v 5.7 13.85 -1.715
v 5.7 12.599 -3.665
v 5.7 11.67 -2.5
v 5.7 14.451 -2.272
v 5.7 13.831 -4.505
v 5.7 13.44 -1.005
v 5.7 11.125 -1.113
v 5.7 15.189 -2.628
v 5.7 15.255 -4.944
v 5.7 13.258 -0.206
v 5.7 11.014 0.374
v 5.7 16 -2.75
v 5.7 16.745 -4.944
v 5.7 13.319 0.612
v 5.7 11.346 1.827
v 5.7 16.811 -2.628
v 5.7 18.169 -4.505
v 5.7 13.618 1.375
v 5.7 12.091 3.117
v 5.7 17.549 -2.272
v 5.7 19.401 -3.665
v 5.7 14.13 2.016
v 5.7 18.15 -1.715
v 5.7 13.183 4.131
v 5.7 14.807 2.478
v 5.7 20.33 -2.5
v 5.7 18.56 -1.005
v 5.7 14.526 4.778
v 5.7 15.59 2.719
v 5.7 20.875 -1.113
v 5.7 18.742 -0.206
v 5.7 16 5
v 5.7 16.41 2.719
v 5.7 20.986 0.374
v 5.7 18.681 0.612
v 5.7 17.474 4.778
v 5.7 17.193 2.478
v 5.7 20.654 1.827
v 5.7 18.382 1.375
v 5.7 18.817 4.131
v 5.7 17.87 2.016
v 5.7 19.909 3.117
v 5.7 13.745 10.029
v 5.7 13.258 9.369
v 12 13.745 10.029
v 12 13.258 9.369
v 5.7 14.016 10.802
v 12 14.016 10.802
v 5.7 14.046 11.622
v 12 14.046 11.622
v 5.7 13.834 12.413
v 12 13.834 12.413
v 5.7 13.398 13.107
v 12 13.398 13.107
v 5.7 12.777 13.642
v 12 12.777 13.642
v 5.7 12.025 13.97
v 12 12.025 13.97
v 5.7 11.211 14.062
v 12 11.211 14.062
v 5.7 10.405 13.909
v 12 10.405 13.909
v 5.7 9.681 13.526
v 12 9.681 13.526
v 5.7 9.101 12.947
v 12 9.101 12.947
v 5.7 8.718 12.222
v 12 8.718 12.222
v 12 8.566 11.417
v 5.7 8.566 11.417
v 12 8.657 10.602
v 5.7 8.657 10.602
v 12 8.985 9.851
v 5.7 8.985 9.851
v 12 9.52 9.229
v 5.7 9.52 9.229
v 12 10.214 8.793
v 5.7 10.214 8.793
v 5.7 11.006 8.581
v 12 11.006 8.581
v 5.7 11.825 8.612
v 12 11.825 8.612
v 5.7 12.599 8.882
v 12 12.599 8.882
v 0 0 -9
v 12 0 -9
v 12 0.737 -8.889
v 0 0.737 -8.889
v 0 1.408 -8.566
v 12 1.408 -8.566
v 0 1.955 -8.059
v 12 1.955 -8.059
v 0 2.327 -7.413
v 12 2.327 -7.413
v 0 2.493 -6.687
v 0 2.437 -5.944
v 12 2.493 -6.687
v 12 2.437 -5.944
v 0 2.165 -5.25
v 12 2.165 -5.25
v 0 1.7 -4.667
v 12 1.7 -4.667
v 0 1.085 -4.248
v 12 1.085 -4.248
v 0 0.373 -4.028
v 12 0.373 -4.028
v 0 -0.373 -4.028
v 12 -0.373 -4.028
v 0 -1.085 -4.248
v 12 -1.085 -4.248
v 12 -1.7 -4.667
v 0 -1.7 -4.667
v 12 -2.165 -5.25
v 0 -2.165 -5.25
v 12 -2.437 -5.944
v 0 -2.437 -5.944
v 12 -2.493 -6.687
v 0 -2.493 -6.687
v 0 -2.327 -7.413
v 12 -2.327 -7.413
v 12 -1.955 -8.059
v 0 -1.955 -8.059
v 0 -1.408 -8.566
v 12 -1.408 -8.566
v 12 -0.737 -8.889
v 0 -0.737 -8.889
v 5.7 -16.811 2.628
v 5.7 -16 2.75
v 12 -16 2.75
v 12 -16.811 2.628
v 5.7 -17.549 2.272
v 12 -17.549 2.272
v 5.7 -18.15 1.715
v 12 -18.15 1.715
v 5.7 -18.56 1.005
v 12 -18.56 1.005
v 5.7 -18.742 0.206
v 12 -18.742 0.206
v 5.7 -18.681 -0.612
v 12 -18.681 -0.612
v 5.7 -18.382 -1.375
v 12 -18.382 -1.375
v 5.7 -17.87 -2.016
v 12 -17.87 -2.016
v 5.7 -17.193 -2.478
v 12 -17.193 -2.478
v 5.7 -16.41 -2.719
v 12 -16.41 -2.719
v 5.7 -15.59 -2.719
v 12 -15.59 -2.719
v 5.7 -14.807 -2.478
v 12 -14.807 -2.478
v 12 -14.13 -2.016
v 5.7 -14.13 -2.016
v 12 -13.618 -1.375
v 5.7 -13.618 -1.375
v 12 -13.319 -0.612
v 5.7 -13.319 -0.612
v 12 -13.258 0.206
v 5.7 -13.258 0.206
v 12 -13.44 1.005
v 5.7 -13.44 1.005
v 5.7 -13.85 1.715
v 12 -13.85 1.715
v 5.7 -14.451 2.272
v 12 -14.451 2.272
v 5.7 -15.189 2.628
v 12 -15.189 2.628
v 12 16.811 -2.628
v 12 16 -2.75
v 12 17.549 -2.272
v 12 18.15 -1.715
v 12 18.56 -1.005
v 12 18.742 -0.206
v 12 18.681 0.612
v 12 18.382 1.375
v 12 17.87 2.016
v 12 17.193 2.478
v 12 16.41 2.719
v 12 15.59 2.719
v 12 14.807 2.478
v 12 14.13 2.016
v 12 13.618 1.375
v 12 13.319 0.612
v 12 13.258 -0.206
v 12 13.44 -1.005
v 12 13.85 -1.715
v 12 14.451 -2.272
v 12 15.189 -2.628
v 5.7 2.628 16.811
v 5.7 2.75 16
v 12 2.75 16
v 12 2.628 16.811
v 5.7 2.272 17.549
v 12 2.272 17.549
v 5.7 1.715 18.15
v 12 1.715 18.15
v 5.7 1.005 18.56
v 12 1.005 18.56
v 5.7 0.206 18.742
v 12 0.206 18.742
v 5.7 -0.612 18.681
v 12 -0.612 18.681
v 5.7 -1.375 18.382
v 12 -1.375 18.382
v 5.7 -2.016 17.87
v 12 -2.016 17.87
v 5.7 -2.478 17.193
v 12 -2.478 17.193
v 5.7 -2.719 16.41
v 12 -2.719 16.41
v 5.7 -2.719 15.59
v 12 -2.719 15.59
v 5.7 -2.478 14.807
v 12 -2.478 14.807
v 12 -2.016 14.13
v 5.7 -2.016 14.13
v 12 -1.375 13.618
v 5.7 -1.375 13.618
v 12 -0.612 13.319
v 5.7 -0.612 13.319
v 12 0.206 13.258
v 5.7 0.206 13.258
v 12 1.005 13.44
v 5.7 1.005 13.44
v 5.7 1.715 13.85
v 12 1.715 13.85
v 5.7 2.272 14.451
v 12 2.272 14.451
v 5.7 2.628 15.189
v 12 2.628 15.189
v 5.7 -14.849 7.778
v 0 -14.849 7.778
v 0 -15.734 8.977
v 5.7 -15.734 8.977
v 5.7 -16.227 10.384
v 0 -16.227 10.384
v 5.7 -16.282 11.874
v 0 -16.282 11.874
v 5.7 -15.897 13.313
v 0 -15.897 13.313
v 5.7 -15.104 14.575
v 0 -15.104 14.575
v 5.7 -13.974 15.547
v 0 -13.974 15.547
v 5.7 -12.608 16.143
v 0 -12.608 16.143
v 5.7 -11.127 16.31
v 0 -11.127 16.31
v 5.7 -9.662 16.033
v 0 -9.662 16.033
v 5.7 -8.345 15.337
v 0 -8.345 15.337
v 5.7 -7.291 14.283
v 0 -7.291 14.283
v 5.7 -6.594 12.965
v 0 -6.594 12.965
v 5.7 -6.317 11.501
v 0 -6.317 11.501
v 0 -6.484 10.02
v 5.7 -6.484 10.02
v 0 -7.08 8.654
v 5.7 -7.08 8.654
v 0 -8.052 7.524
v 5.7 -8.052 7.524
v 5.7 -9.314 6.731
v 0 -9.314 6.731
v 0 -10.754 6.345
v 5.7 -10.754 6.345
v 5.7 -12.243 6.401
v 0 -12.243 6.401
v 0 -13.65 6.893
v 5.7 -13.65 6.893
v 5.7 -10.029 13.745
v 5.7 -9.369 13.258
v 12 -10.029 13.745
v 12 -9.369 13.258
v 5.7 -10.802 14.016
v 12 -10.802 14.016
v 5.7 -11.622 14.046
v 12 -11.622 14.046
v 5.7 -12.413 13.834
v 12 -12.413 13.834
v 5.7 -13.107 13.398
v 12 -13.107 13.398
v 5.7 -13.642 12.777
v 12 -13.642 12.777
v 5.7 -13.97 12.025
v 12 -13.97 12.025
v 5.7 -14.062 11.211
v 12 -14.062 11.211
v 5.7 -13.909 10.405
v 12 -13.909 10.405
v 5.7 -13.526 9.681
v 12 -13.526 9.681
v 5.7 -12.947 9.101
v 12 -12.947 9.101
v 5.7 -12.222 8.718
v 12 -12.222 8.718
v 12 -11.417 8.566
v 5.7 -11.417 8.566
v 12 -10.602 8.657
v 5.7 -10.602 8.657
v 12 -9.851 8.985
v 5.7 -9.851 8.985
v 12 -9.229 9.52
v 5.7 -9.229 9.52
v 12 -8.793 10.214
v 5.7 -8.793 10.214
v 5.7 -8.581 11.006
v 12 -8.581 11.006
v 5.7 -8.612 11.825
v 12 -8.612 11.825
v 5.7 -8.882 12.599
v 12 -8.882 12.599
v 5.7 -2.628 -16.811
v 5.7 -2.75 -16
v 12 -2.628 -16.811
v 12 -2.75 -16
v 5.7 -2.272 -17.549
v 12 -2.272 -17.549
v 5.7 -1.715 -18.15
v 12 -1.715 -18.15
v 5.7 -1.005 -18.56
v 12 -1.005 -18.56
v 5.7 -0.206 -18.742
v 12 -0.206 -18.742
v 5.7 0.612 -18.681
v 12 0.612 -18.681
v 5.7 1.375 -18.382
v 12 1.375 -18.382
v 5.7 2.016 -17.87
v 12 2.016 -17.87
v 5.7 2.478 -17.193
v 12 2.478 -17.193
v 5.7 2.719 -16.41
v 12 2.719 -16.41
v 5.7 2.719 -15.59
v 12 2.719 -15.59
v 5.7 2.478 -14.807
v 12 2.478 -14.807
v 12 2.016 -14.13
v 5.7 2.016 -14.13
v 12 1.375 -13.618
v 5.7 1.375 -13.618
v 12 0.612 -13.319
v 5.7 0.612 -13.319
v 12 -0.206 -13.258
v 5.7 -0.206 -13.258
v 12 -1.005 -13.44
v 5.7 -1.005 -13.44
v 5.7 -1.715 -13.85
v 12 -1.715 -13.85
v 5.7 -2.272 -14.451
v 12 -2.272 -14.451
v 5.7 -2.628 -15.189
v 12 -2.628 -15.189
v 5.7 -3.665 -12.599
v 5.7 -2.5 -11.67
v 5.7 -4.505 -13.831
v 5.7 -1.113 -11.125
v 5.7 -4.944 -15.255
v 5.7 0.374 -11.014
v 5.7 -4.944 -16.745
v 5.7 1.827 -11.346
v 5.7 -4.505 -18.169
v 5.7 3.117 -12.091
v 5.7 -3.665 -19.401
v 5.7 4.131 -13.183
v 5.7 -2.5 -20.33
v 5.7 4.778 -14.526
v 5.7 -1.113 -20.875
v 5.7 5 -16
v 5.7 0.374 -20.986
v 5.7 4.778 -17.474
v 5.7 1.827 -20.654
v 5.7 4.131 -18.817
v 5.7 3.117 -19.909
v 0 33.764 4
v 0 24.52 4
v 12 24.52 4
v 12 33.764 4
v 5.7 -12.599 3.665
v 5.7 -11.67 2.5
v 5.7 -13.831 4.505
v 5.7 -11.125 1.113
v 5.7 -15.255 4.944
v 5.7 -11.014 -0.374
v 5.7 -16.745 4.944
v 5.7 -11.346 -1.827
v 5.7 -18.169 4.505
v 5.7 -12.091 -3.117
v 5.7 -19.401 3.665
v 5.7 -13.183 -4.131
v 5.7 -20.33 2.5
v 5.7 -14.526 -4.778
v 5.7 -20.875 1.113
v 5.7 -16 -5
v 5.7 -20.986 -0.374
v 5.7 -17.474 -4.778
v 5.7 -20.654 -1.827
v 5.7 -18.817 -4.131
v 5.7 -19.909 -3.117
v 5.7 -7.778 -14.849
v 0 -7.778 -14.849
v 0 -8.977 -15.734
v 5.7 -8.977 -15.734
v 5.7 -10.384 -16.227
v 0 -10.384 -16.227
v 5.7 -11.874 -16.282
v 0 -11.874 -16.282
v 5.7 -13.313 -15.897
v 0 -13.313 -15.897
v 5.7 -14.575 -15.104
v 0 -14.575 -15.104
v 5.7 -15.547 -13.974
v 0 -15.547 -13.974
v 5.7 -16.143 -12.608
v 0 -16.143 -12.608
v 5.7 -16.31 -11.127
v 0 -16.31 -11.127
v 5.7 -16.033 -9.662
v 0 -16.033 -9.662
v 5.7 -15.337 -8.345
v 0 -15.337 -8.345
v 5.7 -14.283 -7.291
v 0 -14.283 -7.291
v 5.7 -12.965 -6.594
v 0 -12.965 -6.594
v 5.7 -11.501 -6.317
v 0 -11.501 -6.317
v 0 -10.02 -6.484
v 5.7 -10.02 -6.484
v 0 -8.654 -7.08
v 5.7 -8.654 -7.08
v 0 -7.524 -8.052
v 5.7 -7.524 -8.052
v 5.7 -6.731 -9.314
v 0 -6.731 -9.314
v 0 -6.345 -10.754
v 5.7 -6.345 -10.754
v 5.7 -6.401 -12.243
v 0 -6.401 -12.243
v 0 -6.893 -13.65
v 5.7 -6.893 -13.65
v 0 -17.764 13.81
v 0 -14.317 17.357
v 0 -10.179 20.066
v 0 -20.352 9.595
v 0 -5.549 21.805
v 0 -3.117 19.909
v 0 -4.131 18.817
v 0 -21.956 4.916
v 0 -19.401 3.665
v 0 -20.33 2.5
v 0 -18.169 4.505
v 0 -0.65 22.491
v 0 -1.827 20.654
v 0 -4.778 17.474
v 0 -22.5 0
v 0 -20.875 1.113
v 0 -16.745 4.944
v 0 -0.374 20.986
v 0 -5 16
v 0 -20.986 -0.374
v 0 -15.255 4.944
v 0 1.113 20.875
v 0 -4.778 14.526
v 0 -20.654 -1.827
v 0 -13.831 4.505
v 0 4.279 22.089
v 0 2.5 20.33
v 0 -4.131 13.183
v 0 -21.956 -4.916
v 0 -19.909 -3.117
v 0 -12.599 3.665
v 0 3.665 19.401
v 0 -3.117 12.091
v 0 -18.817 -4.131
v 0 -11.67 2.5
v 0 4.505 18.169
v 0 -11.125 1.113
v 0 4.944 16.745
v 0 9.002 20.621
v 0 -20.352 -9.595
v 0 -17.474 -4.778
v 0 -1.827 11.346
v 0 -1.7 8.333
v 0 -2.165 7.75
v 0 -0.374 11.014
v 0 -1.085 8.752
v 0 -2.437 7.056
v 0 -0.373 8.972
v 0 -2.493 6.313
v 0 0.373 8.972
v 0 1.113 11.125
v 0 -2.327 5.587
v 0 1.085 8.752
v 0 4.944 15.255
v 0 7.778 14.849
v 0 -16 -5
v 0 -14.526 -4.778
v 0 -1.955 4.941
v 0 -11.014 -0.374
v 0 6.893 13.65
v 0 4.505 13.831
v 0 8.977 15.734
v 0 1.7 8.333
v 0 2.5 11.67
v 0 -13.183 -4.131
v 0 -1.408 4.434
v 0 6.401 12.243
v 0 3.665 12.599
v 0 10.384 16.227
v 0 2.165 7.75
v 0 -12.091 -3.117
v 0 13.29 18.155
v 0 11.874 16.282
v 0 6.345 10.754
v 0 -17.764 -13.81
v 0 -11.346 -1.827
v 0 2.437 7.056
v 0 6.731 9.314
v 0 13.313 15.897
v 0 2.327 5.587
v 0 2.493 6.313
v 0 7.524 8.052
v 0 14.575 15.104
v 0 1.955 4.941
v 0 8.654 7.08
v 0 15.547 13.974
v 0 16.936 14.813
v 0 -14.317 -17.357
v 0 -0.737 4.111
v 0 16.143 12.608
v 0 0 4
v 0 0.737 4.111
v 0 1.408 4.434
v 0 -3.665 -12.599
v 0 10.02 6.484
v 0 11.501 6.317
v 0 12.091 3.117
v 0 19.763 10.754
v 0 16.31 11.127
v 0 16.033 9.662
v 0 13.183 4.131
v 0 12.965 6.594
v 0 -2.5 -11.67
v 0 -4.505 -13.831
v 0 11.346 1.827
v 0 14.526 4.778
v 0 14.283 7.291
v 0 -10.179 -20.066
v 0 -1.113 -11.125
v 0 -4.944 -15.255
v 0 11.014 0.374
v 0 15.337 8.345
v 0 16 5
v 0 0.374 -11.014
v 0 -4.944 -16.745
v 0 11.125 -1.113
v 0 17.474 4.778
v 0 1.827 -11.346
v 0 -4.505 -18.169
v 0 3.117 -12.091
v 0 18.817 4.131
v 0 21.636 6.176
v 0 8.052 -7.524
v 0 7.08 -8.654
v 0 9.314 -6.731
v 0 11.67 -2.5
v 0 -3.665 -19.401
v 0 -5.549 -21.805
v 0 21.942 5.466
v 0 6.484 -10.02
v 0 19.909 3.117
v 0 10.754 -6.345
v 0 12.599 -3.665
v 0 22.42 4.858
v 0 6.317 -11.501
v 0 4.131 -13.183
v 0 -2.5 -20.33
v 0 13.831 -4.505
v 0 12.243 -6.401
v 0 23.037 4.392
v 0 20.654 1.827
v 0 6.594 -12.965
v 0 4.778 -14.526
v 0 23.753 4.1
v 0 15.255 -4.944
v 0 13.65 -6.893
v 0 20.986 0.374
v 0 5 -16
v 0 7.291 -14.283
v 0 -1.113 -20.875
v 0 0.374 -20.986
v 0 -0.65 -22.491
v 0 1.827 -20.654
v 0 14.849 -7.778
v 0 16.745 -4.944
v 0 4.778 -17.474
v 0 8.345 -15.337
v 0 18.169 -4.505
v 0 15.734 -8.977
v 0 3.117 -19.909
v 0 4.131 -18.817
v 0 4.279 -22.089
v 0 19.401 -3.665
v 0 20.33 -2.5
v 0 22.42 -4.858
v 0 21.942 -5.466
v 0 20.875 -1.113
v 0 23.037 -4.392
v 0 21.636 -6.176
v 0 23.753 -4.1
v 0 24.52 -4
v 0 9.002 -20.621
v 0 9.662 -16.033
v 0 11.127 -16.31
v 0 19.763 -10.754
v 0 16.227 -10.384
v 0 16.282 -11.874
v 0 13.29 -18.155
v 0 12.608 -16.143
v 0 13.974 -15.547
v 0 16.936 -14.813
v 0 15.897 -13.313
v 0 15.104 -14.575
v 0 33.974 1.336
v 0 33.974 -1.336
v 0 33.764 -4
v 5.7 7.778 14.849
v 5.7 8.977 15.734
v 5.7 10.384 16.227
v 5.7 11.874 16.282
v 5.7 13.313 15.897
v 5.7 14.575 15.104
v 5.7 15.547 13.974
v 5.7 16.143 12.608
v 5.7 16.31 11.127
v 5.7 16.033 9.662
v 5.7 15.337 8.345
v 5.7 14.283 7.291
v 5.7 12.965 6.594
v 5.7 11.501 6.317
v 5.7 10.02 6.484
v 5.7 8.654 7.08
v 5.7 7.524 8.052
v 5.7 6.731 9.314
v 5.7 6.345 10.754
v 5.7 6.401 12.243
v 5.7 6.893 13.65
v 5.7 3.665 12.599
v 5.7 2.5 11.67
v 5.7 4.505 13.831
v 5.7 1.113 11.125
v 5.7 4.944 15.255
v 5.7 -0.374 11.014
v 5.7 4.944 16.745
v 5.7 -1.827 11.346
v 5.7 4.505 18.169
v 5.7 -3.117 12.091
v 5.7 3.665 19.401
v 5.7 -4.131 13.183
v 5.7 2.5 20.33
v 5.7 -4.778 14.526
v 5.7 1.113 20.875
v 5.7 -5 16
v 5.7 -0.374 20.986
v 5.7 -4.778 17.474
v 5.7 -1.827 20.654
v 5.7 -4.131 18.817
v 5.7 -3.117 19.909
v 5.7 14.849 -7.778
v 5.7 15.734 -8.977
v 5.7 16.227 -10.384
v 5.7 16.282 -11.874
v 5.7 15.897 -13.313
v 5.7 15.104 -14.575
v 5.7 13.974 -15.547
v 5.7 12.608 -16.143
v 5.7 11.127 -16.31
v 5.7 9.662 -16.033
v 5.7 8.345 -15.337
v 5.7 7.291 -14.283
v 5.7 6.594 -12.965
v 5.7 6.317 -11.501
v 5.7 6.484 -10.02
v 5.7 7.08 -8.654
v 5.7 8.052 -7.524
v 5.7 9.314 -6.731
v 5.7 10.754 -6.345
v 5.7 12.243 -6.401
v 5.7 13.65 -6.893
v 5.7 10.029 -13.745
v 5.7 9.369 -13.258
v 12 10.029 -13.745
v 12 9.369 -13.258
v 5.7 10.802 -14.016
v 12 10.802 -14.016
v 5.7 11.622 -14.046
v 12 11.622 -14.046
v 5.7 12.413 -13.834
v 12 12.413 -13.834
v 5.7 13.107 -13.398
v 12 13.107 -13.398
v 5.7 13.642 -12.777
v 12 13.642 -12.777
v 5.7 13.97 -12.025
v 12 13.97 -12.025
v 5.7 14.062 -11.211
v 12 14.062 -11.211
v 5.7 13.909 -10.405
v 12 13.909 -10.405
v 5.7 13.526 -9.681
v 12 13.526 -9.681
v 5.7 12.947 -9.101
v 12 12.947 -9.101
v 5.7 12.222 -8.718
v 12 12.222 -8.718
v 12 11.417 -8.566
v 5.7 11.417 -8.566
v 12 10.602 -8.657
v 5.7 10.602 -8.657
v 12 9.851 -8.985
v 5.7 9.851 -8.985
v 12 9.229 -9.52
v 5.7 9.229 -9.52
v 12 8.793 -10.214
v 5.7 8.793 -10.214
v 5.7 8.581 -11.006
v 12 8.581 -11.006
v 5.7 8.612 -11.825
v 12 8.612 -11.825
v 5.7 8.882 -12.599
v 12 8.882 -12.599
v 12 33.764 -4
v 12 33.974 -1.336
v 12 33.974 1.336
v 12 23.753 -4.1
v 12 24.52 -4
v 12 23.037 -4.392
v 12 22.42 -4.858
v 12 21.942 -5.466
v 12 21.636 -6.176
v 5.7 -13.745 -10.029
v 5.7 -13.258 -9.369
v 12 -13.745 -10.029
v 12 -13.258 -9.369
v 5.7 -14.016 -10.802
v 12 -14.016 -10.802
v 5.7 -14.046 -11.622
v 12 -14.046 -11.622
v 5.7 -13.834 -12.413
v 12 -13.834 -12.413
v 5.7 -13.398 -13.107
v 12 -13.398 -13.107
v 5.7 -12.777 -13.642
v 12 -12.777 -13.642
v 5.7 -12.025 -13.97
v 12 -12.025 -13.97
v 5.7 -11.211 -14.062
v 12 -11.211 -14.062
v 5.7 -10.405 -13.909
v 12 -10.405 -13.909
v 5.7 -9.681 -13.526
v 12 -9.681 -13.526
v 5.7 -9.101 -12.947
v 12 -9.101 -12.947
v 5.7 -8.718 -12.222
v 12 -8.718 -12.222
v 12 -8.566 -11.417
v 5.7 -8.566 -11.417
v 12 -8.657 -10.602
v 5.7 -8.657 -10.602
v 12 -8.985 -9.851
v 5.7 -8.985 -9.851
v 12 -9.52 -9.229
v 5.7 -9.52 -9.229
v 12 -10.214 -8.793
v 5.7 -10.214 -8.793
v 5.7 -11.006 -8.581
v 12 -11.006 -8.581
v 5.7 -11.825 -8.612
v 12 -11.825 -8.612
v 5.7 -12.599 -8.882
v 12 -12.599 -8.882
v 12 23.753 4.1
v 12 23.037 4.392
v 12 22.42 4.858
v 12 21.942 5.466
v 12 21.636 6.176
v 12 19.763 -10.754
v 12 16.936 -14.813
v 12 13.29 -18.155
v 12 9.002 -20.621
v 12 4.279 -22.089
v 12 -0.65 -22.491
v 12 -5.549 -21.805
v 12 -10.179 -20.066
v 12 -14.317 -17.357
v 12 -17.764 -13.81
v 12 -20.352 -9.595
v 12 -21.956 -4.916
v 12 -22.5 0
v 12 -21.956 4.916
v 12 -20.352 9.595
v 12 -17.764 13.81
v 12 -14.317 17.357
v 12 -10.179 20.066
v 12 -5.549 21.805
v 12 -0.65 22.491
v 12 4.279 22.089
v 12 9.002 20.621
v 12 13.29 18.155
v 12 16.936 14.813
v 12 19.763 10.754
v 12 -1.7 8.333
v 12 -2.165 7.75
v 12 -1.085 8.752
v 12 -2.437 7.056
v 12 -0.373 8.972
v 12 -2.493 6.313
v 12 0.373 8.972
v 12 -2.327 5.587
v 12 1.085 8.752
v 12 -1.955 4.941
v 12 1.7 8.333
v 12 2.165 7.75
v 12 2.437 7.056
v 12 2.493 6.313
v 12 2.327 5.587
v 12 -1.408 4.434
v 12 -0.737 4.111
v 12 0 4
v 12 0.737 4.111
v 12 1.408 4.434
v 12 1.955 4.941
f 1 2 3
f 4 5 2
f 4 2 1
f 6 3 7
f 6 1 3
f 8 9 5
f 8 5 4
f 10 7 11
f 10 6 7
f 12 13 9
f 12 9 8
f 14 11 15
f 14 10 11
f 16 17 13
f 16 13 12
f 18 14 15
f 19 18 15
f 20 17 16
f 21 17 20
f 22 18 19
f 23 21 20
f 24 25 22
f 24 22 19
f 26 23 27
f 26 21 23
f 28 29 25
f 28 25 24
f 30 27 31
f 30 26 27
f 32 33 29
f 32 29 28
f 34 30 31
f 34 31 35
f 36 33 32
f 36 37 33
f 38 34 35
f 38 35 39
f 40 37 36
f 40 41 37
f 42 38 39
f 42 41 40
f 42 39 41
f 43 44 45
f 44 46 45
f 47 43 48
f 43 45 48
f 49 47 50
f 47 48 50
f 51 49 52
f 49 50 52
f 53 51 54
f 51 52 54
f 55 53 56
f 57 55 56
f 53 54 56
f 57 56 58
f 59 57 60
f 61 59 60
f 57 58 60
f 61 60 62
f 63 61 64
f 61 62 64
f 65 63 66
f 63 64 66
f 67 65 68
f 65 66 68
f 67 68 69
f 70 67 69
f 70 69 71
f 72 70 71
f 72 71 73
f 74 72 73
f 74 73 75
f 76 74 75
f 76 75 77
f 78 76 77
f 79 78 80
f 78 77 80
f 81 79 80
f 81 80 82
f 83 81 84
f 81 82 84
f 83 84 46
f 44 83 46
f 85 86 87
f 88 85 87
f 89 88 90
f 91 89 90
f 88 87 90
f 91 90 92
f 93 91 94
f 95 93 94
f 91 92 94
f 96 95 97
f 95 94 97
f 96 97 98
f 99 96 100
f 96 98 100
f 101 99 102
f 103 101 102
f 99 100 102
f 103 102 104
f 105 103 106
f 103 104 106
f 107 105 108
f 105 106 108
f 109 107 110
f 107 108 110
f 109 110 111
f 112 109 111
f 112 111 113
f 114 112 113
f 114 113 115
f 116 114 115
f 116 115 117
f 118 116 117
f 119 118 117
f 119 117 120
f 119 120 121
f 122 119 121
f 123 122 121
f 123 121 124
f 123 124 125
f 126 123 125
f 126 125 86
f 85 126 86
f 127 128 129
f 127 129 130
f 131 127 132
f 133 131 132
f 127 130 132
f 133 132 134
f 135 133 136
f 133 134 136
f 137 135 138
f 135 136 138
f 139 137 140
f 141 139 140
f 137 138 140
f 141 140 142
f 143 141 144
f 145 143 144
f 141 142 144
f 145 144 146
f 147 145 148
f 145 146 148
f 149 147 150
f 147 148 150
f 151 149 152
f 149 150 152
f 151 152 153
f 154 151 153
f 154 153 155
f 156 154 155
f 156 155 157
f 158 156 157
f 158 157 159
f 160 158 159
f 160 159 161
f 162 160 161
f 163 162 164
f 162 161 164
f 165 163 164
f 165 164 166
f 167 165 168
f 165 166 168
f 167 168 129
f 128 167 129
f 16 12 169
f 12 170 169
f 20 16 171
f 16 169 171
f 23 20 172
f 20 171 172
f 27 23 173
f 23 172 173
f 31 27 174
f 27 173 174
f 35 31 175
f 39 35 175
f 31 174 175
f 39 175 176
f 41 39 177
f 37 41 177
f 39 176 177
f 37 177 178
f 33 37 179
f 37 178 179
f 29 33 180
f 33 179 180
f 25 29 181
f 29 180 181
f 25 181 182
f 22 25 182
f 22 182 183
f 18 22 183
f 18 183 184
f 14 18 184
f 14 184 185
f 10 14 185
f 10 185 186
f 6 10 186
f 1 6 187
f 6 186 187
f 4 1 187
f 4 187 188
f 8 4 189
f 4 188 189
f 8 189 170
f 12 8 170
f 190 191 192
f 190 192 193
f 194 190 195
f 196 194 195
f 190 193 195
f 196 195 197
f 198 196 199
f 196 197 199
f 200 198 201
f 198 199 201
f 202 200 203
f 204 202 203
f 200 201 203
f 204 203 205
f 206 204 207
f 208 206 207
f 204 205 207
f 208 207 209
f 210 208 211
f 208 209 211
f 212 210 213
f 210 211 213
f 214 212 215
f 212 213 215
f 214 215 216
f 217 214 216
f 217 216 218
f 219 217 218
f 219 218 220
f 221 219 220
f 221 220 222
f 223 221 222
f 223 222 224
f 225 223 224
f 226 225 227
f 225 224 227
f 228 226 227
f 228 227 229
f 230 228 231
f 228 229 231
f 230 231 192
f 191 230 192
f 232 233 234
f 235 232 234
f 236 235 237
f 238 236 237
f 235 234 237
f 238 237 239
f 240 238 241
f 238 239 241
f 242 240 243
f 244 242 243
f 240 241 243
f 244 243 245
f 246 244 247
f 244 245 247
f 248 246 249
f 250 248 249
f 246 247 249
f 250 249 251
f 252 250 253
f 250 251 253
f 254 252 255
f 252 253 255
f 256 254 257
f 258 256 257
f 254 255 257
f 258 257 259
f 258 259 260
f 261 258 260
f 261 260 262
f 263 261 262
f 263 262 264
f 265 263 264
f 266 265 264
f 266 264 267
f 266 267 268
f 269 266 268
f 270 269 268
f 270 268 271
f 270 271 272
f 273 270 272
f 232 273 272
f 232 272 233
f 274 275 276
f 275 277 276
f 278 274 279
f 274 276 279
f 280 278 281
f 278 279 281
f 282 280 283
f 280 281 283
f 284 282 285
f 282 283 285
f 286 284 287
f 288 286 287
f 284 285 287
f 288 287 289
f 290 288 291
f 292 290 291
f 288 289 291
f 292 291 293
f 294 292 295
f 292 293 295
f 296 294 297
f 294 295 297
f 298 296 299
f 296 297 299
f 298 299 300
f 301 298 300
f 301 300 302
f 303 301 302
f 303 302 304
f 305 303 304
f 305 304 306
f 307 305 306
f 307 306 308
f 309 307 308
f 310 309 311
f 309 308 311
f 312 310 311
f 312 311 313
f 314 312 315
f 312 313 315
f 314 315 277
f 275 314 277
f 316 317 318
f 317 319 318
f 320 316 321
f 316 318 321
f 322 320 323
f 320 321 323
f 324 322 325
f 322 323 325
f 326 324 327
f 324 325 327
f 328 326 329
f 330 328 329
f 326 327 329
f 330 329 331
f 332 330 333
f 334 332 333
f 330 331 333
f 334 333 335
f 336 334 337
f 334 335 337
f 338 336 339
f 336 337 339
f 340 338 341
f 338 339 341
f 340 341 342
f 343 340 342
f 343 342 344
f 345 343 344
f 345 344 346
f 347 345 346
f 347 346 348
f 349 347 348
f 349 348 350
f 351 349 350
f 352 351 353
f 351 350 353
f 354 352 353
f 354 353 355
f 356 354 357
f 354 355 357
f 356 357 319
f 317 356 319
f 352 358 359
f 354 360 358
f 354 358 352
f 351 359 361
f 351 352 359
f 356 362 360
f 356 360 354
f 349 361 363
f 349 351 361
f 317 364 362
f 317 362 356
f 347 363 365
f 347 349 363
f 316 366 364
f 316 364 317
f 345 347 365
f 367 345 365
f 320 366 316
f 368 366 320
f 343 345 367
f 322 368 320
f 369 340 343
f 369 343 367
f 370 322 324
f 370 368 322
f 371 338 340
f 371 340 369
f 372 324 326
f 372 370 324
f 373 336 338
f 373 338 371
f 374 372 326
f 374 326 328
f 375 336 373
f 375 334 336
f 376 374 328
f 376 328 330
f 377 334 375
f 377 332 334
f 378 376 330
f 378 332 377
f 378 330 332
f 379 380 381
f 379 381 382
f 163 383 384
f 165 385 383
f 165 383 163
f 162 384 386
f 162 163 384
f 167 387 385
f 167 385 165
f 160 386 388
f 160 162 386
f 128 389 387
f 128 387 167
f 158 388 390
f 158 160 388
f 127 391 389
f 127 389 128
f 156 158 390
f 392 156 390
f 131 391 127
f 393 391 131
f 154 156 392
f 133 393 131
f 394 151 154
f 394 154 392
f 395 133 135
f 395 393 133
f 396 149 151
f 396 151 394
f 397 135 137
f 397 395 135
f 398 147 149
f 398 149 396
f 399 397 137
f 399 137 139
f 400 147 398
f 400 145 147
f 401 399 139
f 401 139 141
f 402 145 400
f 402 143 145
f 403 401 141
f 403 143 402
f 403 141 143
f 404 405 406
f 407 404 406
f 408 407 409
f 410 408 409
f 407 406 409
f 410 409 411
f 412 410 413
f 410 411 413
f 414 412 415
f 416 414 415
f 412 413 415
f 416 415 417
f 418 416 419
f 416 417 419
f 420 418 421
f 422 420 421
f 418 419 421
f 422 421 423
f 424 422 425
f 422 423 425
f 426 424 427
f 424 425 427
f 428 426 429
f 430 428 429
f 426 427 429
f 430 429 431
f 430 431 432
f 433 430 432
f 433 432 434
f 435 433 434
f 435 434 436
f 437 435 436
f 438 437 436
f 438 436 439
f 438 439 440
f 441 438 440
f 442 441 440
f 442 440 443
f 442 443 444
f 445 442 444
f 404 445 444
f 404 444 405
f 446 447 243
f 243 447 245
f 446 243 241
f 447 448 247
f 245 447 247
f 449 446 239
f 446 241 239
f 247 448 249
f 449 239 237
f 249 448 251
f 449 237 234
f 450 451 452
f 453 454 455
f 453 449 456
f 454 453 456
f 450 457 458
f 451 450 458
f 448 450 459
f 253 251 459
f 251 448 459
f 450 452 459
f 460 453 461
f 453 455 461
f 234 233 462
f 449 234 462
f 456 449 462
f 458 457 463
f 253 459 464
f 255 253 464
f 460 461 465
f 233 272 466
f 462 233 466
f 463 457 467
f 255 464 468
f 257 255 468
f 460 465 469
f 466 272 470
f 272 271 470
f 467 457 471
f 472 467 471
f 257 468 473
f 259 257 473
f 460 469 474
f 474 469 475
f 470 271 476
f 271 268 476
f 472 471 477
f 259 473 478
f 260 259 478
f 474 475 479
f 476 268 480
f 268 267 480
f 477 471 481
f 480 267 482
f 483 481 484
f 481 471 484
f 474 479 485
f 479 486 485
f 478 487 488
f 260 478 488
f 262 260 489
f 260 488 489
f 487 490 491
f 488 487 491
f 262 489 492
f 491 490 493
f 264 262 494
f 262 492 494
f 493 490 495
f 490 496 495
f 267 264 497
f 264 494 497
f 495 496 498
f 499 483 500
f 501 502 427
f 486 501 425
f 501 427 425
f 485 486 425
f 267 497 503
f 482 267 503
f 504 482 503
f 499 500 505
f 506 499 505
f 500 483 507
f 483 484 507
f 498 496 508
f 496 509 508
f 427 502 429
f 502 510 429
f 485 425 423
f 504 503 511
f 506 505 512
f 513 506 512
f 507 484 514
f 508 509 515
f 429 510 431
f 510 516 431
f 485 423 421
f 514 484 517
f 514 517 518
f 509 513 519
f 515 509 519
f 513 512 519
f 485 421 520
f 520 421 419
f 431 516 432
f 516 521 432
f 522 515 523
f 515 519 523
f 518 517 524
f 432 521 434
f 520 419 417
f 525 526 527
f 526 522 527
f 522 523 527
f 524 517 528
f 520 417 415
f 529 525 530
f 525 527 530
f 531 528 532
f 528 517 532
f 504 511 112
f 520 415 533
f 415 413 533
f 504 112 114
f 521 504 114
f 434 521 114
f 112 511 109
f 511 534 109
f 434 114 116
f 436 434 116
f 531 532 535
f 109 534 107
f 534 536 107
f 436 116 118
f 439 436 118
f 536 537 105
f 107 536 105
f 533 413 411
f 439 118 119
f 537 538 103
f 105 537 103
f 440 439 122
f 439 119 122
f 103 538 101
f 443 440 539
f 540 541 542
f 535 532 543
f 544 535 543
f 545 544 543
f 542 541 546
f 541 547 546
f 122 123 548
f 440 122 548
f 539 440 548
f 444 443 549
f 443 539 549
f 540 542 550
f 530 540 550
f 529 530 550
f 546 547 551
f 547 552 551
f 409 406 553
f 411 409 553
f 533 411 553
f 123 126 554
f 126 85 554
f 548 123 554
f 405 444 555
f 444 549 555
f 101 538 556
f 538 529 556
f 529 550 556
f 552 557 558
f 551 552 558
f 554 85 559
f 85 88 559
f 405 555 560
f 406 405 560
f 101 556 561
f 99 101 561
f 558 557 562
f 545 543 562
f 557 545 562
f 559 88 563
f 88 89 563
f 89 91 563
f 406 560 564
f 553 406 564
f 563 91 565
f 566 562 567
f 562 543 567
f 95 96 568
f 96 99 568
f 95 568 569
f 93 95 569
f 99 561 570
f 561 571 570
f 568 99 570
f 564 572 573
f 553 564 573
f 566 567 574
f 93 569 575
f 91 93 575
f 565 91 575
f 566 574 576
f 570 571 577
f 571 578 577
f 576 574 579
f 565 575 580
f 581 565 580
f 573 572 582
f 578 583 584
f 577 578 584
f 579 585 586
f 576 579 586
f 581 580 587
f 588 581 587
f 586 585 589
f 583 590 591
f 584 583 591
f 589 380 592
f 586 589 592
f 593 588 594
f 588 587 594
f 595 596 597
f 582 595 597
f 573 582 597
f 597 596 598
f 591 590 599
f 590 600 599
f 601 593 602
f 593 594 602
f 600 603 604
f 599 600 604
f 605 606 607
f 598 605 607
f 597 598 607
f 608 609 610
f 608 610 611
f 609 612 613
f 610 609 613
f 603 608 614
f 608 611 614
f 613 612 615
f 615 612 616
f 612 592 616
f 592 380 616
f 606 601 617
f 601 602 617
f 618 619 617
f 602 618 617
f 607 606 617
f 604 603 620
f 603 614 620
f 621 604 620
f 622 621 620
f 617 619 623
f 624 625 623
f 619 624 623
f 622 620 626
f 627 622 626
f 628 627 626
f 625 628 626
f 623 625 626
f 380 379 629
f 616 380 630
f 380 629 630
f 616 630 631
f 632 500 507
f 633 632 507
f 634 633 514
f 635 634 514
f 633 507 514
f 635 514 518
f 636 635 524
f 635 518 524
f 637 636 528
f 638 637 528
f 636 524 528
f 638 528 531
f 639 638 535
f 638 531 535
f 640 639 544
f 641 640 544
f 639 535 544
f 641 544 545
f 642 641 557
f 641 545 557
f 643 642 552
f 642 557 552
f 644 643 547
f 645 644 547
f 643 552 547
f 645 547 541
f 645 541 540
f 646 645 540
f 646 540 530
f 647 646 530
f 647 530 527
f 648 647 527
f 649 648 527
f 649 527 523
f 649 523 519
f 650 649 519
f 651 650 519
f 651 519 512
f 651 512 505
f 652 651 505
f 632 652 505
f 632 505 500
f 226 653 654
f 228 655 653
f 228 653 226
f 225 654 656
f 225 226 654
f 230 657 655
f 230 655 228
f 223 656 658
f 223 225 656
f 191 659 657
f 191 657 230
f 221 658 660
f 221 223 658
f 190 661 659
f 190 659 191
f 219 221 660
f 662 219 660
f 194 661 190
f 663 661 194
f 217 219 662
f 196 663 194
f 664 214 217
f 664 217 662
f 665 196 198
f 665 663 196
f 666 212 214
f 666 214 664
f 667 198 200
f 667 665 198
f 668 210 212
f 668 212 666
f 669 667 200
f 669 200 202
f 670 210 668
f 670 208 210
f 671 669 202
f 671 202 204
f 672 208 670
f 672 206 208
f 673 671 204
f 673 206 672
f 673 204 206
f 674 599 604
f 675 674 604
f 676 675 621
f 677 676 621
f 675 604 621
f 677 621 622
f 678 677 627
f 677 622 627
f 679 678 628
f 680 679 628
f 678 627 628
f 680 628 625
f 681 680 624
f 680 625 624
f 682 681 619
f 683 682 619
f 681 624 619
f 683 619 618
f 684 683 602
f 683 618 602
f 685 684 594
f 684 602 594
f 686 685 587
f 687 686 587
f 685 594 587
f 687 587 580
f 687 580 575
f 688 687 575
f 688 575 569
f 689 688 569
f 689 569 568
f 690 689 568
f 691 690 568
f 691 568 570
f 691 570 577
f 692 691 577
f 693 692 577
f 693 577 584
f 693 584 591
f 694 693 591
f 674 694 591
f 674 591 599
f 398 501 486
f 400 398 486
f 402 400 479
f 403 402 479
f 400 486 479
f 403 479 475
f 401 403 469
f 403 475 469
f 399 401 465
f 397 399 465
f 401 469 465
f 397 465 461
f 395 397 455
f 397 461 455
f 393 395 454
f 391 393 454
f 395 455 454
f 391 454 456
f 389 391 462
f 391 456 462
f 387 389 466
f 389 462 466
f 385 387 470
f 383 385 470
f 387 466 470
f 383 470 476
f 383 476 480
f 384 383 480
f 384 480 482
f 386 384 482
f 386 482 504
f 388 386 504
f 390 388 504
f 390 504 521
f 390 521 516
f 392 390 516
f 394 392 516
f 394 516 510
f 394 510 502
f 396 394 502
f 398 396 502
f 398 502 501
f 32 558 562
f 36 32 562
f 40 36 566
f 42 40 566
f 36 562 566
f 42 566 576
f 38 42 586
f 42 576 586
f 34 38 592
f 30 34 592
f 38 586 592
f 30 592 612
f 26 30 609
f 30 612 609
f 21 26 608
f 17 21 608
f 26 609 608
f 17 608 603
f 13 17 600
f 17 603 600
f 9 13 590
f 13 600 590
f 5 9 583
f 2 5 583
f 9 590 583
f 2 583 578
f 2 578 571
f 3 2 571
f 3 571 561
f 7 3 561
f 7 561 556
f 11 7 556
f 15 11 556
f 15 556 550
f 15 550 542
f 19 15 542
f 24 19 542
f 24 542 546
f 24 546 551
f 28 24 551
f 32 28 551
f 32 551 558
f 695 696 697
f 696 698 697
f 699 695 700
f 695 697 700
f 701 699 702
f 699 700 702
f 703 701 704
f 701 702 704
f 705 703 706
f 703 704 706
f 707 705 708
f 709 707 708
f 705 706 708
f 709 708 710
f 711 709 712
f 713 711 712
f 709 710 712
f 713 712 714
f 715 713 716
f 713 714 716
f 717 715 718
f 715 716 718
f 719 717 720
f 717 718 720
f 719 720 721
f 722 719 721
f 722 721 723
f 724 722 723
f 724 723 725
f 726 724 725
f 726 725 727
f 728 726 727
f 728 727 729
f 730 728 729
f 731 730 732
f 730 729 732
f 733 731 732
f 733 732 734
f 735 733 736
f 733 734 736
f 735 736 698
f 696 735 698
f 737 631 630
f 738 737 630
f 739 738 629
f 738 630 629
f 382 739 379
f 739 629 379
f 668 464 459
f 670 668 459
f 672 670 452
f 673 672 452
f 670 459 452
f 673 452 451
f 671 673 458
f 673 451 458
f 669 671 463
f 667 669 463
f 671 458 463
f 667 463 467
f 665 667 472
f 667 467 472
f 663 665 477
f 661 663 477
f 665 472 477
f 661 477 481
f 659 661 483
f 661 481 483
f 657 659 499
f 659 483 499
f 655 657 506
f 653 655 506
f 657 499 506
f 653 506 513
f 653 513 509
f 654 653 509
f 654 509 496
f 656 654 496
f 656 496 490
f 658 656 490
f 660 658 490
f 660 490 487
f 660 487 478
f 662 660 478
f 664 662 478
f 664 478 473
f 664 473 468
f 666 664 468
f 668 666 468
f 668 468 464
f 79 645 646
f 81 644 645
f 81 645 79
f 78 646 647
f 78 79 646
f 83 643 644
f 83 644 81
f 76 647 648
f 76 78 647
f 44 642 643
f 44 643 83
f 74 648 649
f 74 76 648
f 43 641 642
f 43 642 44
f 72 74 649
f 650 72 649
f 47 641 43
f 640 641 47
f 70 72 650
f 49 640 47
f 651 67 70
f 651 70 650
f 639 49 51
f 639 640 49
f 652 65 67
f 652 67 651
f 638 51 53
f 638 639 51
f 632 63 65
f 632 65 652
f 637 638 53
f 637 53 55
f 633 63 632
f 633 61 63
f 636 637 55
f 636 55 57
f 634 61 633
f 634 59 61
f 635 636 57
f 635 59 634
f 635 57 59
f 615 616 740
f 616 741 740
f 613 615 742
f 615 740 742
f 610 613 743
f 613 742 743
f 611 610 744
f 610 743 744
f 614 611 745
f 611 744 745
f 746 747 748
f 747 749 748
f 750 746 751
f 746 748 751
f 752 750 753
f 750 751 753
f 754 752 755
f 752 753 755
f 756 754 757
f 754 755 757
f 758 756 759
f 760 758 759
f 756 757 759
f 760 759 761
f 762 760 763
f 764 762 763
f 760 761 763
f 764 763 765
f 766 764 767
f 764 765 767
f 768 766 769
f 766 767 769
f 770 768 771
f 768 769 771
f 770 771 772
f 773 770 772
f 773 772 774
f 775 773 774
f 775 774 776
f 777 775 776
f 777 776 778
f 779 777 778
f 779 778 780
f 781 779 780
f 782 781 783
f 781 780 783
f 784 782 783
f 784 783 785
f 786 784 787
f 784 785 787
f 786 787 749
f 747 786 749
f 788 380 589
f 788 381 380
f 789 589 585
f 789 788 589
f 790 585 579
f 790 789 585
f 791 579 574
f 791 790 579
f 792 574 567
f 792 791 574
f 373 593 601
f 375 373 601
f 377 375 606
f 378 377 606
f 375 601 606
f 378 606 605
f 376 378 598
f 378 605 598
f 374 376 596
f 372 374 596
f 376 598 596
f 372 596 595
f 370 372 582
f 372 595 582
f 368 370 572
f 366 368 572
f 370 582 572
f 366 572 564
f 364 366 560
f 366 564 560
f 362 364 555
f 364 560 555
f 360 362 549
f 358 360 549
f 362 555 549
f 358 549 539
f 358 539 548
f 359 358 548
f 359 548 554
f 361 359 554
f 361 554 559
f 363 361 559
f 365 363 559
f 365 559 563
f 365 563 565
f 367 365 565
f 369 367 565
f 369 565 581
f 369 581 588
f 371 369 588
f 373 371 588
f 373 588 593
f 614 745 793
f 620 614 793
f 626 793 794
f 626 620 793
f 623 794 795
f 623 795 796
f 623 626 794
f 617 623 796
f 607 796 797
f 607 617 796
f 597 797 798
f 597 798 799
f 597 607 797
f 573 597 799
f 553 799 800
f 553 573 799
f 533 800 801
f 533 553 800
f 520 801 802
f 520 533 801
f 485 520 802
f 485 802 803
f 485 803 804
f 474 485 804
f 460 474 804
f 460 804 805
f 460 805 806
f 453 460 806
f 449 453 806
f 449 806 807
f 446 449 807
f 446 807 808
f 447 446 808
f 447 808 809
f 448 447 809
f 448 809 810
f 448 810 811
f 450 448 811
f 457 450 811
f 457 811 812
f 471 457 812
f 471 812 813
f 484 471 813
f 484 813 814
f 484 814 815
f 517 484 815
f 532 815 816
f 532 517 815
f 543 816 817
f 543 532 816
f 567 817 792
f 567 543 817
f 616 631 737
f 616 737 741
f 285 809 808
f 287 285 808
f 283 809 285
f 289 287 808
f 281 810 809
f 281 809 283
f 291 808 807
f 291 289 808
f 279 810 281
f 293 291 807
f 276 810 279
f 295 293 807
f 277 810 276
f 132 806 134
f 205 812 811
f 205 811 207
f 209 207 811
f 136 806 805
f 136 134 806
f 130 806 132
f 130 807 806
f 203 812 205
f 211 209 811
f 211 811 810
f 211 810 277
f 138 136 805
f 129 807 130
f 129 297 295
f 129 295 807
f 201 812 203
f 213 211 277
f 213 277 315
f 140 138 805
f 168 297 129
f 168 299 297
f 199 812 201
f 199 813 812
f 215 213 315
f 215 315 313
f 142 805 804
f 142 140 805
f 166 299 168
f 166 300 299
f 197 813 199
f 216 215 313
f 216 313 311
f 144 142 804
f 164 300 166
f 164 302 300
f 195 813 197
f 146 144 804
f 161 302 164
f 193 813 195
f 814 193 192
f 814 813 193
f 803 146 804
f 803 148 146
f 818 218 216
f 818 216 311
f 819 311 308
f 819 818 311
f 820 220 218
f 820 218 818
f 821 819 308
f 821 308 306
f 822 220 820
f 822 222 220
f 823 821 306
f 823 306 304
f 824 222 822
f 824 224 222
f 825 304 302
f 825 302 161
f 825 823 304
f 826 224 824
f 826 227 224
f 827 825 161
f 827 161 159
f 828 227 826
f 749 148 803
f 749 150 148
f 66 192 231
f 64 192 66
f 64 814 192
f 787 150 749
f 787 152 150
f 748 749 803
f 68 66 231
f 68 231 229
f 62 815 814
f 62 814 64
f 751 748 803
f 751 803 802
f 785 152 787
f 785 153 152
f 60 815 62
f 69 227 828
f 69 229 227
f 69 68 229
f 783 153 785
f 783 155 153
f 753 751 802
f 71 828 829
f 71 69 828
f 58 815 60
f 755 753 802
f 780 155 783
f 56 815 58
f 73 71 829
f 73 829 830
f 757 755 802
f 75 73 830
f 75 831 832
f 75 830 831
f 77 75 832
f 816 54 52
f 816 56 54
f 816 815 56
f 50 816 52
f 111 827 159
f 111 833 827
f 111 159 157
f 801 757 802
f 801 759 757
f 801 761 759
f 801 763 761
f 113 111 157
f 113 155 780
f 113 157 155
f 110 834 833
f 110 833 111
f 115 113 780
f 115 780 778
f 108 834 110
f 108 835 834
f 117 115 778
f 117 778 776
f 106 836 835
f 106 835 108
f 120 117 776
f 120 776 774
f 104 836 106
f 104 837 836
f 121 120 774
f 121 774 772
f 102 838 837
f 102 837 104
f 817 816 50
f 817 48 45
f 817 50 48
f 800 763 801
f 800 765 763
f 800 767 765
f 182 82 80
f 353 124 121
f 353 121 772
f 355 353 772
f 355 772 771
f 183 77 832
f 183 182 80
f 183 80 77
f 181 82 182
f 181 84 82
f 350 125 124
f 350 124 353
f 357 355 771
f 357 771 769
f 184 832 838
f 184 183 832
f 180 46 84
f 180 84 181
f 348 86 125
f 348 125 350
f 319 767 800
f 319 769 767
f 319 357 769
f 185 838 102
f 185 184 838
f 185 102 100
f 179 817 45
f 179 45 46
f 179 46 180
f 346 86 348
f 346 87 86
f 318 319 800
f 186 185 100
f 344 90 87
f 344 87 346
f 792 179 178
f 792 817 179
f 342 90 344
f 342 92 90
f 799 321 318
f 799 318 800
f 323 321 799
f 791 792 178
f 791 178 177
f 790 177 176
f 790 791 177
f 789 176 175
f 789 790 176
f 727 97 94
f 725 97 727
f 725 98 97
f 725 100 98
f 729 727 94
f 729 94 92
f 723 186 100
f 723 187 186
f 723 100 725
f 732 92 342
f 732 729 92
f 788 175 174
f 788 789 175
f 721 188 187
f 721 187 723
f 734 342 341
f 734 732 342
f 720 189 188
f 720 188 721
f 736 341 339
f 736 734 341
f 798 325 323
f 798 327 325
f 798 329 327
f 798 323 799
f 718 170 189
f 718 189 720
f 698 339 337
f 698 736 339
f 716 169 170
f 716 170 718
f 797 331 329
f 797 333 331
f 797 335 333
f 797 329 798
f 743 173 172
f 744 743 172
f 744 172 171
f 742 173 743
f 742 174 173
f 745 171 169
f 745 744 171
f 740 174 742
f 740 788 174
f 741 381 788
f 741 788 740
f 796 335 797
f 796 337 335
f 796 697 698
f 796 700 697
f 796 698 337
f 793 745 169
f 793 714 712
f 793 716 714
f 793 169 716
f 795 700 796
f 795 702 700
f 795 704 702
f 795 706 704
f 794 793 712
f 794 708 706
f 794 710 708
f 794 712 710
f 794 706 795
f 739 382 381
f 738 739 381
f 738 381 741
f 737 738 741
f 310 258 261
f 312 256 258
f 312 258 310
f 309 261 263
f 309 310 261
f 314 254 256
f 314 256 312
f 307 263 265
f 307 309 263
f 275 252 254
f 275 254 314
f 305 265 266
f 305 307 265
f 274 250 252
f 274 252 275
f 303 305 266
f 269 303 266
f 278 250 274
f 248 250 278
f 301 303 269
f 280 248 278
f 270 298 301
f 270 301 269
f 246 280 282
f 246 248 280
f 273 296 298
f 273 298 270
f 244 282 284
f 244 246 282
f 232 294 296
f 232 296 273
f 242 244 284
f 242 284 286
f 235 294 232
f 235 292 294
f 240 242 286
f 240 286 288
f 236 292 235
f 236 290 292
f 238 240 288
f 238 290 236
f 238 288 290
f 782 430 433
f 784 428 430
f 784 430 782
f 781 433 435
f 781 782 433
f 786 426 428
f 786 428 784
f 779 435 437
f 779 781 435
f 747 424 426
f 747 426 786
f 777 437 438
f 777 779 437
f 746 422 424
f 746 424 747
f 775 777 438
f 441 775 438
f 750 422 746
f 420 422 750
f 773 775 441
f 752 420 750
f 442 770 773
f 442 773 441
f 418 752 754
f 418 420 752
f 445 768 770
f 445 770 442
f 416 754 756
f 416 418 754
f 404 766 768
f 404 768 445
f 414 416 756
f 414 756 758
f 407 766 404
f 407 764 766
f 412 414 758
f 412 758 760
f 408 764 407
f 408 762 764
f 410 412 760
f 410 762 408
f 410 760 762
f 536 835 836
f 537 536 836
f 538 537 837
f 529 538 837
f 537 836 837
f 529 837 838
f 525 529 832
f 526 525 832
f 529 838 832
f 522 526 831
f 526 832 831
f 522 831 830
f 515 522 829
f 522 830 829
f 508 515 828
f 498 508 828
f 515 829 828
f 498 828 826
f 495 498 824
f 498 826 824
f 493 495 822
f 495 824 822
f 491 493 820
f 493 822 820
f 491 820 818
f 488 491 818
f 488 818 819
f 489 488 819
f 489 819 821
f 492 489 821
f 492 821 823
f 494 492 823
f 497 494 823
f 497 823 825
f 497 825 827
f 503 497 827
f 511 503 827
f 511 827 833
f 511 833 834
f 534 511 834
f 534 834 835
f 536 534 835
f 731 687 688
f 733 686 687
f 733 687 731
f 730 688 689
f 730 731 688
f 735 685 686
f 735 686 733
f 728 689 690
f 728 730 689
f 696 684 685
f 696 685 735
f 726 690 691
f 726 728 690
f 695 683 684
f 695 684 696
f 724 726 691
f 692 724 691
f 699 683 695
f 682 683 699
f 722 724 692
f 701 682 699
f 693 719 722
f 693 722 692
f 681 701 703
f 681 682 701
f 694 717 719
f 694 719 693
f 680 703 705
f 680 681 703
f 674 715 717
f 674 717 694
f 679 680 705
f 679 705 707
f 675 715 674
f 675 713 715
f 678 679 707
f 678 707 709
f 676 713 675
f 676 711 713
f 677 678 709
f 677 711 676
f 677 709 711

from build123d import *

# Parameters (mm, degrees)
SKETCH_1_R                = 34
EXTRUDE_1_DEPTH           = 12
HOLE_WIZARD_1_D           = 5.5
HOLE_WIZARD_1_CBORE_D     = 10
HOLE_WIZARD_1_CBORE_DEPTH = 5.7
PATTERN_CIRCULAR_1_COUNT  = 8
SKETCH_4_OUTSIDE_W        = 89.382
SKETCH_4_OUTSIDE_H        = 89.382
CUT_EXTRUDE_2_DEPTH       = 50.558046773
HOLE_WIZARD_M6_1_D        = 5
FILLET_1_R                = 3


with BuildPart() as part:
    # 草图1 → 凸台-拉伸1 (new body)
    with BuildSketch(Plane(origin=(0, 0, 0), x_dir=(0, 0, -1), z_dir=(1, 0, 0))):
        Circle(SKETCH_1_R)
    extrude(amount=EXTRUDE_1_DEPTH)

    # 打孔尺寸根据内六角圆柱头螺钉的类型1 (through all)
    with Locations(Plane.ZY):
        with Locations((0, 16)):
            hole_wizard_1 = CounterBoreHole(HOLE_WIZARD_1_D / 2, HOLE_WIZARD_1_CBORE_D / 2, HOLE_WIZARD_1_CBORE_DEPTH)

    # 阵列(圆周)1: 打孔尺寸根据内六角圆柱头螺钉的类型1 ×8 about axis
    pattern_circular_1_axis = Axis((0, 0, 0), (1, 0, 0))
    for i in range(1, PATTERN_CIRCULAR_1_COUNT):
        add(hole_wizard_1.rotate(pattern_circular_1_axis, i * 360 / PATTERN_CIRCULAR_1_COUNT), mode=Mode.SUBTRACT)

    # 草图4 outside → 切除-拉伸2 (cut, through all)
    with BuildSketch(Plane.ZY):
        Rectangle(SKETCH_4_OUTSIDE_W, SKETCH_4_OUTSIDE_H)
        with BuildLine():
            Line((-4, 33.763886032), (-4, 22.141589825))
            ThreePointArc((-4, 22.141589825), (0, -22.5), (4, 22.141589825))
            Line((4, 22.141589825), (4, 33.763886032))
            ThreePointArc((4, 33.763886032), (0, 34), (-4, 33.763886032))
        make_face(mode=Mode.SUBTRACT)
    extrude(amount=-CUT_EXTRUDE_2_DEPTH, mode=Mode.SUBTRACT)

    # M6 螺纹孔1 (through all)
    with Locations(Plane.ZY):
        with Locations((6.5, 0), (-6.5, 0)):
            Hole(HOLE_WIZARD_M6_1_D / 2)

    # 圆角1
    fillet_1_edges = [part.edges().sort_by_distance(p)[0] for p in [
        (6, 22.141589825, 4),
        (6, 22.141589825, -4),
    ]]
    fillet(fillet_1_edges, radius=FILLET_1_R)


solid = part.part
